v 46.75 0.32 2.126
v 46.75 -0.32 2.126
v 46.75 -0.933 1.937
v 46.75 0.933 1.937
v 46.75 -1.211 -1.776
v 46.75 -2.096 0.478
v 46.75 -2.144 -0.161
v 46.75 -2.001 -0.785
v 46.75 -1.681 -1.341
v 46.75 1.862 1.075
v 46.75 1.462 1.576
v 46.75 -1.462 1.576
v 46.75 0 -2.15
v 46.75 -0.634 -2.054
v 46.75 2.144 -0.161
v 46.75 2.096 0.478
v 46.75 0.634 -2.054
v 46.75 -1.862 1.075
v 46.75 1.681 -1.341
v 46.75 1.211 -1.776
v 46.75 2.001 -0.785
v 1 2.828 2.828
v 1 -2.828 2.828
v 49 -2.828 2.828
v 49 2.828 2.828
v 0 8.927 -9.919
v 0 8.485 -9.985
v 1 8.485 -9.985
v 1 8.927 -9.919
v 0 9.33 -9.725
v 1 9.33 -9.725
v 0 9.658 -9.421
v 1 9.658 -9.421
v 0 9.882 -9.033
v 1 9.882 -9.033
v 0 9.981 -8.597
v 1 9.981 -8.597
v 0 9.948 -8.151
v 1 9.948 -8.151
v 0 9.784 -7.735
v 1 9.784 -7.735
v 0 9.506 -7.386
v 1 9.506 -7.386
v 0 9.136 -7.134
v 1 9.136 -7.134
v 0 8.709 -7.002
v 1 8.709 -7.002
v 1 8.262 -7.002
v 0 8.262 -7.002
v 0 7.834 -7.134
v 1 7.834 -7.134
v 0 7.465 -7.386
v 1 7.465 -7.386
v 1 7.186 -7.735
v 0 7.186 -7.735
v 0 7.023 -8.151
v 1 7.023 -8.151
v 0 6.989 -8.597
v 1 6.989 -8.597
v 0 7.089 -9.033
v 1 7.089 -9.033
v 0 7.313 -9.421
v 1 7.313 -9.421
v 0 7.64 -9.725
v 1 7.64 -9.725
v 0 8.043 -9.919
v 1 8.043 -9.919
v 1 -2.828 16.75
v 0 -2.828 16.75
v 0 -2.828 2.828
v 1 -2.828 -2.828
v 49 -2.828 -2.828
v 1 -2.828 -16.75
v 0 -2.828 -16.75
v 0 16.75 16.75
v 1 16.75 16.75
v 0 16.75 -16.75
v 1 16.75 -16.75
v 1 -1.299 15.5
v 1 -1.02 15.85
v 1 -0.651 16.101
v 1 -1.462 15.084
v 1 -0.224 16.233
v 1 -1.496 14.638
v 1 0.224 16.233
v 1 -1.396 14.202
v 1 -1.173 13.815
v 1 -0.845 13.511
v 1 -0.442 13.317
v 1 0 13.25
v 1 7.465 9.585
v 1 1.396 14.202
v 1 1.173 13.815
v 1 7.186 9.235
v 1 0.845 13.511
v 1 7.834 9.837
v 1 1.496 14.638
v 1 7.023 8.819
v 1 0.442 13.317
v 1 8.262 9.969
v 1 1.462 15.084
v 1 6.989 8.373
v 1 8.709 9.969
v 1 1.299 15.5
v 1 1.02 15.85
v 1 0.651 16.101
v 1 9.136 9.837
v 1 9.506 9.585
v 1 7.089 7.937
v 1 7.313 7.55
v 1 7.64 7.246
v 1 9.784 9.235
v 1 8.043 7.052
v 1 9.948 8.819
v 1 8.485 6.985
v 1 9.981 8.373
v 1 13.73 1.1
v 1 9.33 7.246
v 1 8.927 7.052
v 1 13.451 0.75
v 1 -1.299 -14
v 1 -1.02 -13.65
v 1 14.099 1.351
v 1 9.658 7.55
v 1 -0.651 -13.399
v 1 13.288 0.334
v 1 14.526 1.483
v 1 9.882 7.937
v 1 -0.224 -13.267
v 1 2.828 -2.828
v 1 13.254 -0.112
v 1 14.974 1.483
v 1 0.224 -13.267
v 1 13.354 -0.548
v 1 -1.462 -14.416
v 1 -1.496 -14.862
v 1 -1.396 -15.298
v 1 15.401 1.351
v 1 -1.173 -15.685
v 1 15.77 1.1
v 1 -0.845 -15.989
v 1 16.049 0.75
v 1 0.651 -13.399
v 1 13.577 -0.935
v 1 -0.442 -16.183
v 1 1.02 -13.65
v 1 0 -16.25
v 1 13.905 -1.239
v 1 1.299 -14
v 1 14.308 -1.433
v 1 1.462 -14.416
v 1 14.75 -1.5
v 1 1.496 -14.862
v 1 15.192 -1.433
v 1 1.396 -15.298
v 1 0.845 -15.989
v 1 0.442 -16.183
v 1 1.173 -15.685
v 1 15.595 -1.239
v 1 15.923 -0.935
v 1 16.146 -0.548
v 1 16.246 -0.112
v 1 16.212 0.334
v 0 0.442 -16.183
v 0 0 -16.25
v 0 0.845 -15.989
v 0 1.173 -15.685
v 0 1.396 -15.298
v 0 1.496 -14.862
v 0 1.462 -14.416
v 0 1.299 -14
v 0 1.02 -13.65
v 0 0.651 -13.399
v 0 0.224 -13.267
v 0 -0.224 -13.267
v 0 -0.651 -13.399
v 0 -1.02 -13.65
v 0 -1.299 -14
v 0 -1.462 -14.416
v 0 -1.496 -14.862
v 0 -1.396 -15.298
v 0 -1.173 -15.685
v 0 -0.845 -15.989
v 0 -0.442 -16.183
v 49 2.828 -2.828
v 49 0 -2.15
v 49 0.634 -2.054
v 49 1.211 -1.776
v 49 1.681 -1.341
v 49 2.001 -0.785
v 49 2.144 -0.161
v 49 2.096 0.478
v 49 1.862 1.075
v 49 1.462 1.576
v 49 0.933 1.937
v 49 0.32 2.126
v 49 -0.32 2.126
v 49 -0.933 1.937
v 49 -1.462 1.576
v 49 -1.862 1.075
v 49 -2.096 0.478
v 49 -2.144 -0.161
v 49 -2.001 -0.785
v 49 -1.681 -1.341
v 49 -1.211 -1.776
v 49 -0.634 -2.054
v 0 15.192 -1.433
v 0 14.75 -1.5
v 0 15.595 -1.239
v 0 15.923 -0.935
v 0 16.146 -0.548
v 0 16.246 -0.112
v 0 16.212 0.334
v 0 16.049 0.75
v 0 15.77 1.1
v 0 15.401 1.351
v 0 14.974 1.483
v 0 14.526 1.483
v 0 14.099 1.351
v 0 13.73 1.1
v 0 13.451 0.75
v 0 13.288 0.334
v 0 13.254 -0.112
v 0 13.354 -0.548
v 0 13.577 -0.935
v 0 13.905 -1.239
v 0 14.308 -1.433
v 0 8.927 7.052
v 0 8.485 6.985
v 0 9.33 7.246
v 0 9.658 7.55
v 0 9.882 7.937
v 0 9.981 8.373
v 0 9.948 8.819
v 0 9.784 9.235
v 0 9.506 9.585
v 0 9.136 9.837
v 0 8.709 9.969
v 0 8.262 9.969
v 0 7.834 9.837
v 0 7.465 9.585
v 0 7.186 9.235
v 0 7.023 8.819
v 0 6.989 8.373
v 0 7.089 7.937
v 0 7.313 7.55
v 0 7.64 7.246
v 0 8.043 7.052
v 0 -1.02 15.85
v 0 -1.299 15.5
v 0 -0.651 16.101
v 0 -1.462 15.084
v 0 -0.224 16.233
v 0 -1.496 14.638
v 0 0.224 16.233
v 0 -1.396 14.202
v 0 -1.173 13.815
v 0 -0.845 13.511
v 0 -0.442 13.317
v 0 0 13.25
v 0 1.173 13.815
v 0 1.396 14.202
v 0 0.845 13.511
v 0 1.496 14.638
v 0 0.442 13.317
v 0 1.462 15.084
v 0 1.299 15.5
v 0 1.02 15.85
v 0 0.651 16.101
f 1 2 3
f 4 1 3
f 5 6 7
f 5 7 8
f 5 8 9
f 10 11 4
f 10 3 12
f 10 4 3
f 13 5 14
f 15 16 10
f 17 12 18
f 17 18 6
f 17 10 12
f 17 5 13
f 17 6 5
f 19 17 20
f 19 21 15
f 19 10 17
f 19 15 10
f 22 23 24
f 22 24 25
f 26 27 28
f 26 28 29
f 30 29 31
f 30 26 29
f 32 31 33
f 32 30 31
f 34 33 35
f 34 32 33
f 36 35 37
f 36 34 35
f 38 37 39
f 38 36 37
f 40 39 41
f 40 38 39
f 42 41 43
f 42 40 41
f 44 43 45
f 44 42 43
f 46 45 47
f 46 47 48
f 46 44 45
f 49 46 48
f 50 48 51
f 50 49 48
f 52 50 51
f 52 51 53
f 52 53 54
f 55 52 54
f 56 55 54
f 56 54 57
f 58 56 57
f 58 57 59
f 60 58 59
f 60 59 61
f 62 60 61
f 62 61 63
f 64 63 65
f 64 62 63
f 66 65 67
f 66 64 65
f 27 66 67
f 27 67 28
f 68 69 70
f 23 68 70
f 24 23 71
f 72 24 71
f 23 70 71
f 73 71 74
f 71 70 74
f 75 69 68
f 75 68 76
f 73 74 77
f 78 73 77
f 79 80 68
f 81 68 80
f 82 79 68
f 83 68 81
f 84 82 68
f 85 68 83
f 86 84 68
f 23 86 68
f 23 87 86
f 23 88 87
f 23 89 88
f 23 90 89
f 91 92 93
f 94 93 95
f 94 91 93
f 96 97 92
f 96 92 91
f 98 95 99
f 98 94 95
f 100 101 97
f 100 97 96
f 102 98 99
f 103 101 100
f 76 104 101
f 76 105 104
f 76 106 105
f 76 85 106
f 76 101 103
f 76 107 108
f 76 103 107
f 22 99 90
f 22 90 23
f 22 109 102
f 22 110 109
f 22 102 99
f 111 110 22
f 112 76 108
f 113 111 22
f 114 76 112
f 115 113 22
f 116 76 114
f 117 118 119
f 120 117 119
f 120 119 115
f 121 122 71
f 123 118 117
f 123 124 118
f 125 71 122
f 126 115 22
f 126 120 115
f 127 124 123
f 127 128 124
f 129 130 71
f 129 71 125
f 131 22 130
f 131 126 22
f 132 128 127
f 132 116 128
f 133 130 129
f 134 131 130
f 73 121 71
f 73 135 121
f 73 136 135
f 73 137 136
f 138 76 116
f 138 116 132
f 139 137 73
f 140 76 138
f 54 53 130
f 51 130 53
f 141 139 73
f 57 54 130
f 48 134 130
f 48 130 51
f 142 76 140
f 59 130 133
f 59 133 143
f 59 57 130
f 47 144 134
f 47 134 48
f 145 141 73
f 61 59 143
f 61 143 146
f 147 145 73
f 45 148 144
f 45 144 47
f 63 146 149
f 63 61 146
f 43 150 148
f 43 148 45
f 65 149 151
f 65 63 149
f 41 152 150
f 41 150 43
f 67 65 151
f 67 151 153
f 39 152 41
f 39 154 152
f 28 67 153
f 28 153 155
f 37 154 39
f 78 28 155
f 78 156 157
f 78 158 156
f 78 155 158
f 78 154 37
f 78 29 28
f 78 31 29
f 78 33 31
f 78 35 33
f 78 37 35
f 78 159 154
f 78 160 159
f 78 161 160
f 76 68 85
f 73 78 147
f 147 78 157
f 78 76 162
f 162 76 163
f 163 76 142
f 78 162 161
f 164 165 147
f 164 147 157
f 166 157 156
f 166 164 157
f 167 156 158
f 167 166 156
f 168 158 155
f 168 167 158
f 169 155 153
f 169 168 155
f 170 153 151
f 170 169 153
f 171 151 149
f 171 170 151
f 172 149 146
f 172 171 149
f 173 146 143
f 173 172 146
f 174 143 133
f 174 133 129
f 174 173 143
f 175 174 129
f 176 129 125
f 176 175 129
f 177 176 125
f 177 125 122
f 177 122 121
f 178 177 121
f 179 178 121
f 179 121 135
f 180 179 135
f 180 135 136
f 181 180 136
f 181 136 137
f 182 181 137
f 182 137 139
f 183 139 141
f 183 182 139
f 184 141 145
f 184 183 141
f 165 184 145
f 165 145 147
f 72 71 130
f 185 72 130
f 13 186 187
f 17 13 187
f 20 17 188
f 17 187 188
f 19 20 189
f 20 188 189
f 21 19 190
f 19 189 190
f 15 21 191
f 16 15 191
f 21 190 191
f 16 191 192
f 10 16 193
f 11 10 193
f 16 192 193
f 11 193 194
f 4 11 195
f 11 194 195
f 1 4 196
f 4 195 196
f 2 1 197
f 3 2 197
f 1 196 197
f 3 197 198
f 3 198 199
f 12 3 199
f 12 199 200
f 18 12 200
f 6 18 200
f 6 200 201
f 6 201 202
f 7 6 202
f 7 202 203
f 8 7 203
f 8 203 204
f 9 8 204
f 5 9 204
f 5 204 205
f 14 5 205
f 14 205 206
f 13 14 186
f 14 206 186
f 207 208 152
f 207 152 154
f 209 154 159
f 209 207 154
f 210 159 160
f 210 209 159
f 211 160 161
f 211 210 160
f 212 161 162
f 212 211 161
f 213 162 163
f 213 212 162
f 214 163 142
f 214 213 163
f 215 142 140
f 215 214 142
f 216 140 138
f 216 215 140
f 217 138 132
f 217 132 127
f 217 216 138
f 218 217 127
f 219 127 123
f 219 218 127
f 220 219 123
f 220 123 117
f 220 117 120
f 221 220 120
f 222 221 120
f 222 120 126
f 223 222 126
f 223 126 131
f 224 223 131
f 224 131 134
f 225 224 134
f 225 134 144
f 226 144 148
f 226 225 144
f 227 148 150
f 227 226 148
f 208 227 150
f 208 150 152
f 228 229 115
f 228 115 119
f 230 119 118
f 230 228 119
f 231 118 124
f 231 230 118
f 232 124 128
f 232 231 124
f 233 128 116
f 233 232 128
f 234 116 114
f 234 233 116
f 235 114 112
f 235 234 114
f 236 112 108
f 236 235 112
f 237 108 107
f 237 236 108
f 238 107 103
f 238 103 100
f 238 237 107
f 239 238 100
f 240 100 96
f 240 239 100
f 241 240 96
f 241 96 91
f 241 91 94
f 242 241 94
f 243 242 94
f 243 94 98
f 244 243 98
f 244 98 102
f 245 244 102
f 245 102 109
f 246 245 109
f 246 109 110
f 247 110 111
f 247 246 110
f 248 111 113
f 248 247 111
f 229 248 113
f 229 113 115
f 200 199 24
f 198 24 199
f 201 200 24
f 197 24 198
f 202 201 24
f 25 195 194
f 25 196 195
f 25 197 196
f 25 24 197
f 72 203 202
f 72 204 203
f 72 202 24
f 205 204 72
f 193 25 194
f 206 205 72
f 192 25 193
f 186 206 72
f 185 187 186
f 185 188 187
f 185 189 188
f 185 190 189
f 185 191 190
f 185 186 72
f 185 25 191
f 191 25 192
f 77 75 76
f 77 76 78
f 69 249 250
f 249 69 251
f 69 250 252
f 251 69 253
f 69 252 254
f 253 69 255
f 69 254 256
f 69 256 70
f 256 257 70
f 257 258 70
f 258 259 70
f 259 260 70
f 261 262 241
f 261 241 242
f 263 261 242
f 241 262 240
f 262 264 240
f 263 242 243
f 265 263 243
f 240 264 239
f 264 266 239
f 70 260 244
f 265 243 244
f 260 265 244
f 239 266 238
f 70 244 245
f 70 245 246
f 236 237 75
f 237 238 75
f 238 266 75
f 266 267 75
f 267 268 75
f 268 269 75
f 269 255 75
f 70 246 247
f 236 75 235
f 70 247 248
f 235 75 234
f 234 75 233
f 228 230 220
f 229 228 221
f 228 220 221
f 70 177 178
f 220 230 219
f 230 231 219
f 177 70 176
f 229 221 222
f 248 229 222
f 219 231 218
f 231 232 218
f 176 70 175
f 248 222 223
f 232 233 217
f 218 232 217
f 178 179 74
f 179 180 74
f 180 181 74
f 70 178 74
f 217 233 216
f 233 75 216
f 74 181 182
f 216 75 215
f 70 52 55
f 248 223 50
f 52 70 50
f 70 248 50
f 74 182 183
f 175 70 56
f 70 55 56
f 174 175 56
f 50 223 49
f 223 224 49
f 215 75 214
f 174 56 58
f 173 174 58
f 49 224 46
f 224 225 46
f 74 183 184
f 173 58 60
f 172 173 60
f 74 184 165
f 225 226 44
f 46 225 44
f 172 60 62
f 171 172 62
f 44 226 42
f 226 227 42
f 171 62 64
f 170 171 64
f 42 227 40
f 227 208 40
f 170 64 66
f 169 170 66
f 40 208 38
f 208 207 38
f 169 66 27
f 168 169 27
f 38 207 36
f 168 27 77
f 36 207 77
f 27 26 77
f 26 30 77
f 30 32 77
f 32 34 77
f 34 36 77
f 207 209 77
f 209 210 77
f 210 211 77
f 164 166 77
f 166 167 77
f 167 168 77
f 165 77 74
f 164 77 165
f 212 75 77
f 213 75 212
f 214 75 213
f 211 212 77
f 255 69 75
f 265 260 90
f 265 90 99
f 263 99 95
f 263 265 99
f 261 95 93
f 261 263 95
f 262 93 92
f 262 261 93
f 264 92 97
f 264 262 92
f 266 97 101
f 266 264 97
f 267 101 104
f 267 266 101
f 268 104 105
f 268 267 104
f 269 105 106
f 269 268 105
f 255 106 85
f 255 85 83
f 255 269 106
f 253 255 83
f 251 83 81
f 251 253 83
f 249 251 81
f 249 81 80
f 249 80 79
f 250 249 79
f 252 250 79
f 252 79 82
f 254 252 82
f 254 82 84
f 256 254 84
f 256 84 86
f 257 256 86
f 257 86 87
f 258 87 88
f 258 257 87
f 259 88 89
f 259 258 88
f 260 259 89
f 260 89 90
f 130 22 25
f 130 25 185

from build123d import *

# Parameters (mm, degrees)
SKETCH1_W           = 33.5
SKETCH1_H           = 19.578427125
SKETCH1_R           = 1.5
BOSS_EXTRUDE1_DEPTH = 1
SKETCH1_3_W         = 5.65685425
SKETCH1_3_H         = 5.65685425
BOSS_EXTRUDE2_DEPTH = 49
SKETCH3_R           = 2.15
CUT_EXTRUDE1_DEPTH  = 2.25


with BuildPart() as part:
    # Sketch1 → Boss-Extrude1 (new body)
    with BuildSketch(Plane(origin=(0, 0, 0), x_dir=(0, 0, -1), z_dir=(1, 0, 0))):
        with Locations((0, 6.960786437)):
            Rectangle(SKETCH1_W, SKETCH1_H)
        with Locations((-14.75, 0)):
            Circle(SKETCH1_R, mode=Mode.SUBTRACT)
        with Locations((14.75, 0)):
            Circle(SKETCH1_R, mode=Mode.SUBTRACT)
        with Locations((-8.485281374, 8.485281374)):
            Circle(SKETCH1_R, mode=Mode.SUBTRACT)
        with Locations((8.485281374, 8.485281374)):
            Circle(SKETCH1_R, mode=Mode.SUBTRACT)
        with Locations((0, 14.75)):
            Circle(SKETCH1_R, mode=Mode.SUBTRACT)
    extrude(amount=BOSS_EXTRUDE1_DEPTH)

    # Sketch1<3> → Boss-Extrude2 (add)
    with BuildSketch(Plane(origin=(0, 0, 0), x_dir=(0, 0, -1), z_dir=(1, 0, 0))):
        Rectangle(SKETCH1_3_W, SKETCH1_3_H)
    extrude(amount=BOSS_EXTRUDE2_DEPTH)

    # Sketch3 → Cut-Extrude1 (cut)
    with BuildSketch(Plane(origin=(49, 0, 0), x_dir=(0, 0, -1), z_dir=(1, 0, 0))):
        Circle(SKETCH3_R)
    extrude(amount=-CUT_EXTRUDE1_DEPTH, mode=Mode.SUBTRACT)


solid = part.part
